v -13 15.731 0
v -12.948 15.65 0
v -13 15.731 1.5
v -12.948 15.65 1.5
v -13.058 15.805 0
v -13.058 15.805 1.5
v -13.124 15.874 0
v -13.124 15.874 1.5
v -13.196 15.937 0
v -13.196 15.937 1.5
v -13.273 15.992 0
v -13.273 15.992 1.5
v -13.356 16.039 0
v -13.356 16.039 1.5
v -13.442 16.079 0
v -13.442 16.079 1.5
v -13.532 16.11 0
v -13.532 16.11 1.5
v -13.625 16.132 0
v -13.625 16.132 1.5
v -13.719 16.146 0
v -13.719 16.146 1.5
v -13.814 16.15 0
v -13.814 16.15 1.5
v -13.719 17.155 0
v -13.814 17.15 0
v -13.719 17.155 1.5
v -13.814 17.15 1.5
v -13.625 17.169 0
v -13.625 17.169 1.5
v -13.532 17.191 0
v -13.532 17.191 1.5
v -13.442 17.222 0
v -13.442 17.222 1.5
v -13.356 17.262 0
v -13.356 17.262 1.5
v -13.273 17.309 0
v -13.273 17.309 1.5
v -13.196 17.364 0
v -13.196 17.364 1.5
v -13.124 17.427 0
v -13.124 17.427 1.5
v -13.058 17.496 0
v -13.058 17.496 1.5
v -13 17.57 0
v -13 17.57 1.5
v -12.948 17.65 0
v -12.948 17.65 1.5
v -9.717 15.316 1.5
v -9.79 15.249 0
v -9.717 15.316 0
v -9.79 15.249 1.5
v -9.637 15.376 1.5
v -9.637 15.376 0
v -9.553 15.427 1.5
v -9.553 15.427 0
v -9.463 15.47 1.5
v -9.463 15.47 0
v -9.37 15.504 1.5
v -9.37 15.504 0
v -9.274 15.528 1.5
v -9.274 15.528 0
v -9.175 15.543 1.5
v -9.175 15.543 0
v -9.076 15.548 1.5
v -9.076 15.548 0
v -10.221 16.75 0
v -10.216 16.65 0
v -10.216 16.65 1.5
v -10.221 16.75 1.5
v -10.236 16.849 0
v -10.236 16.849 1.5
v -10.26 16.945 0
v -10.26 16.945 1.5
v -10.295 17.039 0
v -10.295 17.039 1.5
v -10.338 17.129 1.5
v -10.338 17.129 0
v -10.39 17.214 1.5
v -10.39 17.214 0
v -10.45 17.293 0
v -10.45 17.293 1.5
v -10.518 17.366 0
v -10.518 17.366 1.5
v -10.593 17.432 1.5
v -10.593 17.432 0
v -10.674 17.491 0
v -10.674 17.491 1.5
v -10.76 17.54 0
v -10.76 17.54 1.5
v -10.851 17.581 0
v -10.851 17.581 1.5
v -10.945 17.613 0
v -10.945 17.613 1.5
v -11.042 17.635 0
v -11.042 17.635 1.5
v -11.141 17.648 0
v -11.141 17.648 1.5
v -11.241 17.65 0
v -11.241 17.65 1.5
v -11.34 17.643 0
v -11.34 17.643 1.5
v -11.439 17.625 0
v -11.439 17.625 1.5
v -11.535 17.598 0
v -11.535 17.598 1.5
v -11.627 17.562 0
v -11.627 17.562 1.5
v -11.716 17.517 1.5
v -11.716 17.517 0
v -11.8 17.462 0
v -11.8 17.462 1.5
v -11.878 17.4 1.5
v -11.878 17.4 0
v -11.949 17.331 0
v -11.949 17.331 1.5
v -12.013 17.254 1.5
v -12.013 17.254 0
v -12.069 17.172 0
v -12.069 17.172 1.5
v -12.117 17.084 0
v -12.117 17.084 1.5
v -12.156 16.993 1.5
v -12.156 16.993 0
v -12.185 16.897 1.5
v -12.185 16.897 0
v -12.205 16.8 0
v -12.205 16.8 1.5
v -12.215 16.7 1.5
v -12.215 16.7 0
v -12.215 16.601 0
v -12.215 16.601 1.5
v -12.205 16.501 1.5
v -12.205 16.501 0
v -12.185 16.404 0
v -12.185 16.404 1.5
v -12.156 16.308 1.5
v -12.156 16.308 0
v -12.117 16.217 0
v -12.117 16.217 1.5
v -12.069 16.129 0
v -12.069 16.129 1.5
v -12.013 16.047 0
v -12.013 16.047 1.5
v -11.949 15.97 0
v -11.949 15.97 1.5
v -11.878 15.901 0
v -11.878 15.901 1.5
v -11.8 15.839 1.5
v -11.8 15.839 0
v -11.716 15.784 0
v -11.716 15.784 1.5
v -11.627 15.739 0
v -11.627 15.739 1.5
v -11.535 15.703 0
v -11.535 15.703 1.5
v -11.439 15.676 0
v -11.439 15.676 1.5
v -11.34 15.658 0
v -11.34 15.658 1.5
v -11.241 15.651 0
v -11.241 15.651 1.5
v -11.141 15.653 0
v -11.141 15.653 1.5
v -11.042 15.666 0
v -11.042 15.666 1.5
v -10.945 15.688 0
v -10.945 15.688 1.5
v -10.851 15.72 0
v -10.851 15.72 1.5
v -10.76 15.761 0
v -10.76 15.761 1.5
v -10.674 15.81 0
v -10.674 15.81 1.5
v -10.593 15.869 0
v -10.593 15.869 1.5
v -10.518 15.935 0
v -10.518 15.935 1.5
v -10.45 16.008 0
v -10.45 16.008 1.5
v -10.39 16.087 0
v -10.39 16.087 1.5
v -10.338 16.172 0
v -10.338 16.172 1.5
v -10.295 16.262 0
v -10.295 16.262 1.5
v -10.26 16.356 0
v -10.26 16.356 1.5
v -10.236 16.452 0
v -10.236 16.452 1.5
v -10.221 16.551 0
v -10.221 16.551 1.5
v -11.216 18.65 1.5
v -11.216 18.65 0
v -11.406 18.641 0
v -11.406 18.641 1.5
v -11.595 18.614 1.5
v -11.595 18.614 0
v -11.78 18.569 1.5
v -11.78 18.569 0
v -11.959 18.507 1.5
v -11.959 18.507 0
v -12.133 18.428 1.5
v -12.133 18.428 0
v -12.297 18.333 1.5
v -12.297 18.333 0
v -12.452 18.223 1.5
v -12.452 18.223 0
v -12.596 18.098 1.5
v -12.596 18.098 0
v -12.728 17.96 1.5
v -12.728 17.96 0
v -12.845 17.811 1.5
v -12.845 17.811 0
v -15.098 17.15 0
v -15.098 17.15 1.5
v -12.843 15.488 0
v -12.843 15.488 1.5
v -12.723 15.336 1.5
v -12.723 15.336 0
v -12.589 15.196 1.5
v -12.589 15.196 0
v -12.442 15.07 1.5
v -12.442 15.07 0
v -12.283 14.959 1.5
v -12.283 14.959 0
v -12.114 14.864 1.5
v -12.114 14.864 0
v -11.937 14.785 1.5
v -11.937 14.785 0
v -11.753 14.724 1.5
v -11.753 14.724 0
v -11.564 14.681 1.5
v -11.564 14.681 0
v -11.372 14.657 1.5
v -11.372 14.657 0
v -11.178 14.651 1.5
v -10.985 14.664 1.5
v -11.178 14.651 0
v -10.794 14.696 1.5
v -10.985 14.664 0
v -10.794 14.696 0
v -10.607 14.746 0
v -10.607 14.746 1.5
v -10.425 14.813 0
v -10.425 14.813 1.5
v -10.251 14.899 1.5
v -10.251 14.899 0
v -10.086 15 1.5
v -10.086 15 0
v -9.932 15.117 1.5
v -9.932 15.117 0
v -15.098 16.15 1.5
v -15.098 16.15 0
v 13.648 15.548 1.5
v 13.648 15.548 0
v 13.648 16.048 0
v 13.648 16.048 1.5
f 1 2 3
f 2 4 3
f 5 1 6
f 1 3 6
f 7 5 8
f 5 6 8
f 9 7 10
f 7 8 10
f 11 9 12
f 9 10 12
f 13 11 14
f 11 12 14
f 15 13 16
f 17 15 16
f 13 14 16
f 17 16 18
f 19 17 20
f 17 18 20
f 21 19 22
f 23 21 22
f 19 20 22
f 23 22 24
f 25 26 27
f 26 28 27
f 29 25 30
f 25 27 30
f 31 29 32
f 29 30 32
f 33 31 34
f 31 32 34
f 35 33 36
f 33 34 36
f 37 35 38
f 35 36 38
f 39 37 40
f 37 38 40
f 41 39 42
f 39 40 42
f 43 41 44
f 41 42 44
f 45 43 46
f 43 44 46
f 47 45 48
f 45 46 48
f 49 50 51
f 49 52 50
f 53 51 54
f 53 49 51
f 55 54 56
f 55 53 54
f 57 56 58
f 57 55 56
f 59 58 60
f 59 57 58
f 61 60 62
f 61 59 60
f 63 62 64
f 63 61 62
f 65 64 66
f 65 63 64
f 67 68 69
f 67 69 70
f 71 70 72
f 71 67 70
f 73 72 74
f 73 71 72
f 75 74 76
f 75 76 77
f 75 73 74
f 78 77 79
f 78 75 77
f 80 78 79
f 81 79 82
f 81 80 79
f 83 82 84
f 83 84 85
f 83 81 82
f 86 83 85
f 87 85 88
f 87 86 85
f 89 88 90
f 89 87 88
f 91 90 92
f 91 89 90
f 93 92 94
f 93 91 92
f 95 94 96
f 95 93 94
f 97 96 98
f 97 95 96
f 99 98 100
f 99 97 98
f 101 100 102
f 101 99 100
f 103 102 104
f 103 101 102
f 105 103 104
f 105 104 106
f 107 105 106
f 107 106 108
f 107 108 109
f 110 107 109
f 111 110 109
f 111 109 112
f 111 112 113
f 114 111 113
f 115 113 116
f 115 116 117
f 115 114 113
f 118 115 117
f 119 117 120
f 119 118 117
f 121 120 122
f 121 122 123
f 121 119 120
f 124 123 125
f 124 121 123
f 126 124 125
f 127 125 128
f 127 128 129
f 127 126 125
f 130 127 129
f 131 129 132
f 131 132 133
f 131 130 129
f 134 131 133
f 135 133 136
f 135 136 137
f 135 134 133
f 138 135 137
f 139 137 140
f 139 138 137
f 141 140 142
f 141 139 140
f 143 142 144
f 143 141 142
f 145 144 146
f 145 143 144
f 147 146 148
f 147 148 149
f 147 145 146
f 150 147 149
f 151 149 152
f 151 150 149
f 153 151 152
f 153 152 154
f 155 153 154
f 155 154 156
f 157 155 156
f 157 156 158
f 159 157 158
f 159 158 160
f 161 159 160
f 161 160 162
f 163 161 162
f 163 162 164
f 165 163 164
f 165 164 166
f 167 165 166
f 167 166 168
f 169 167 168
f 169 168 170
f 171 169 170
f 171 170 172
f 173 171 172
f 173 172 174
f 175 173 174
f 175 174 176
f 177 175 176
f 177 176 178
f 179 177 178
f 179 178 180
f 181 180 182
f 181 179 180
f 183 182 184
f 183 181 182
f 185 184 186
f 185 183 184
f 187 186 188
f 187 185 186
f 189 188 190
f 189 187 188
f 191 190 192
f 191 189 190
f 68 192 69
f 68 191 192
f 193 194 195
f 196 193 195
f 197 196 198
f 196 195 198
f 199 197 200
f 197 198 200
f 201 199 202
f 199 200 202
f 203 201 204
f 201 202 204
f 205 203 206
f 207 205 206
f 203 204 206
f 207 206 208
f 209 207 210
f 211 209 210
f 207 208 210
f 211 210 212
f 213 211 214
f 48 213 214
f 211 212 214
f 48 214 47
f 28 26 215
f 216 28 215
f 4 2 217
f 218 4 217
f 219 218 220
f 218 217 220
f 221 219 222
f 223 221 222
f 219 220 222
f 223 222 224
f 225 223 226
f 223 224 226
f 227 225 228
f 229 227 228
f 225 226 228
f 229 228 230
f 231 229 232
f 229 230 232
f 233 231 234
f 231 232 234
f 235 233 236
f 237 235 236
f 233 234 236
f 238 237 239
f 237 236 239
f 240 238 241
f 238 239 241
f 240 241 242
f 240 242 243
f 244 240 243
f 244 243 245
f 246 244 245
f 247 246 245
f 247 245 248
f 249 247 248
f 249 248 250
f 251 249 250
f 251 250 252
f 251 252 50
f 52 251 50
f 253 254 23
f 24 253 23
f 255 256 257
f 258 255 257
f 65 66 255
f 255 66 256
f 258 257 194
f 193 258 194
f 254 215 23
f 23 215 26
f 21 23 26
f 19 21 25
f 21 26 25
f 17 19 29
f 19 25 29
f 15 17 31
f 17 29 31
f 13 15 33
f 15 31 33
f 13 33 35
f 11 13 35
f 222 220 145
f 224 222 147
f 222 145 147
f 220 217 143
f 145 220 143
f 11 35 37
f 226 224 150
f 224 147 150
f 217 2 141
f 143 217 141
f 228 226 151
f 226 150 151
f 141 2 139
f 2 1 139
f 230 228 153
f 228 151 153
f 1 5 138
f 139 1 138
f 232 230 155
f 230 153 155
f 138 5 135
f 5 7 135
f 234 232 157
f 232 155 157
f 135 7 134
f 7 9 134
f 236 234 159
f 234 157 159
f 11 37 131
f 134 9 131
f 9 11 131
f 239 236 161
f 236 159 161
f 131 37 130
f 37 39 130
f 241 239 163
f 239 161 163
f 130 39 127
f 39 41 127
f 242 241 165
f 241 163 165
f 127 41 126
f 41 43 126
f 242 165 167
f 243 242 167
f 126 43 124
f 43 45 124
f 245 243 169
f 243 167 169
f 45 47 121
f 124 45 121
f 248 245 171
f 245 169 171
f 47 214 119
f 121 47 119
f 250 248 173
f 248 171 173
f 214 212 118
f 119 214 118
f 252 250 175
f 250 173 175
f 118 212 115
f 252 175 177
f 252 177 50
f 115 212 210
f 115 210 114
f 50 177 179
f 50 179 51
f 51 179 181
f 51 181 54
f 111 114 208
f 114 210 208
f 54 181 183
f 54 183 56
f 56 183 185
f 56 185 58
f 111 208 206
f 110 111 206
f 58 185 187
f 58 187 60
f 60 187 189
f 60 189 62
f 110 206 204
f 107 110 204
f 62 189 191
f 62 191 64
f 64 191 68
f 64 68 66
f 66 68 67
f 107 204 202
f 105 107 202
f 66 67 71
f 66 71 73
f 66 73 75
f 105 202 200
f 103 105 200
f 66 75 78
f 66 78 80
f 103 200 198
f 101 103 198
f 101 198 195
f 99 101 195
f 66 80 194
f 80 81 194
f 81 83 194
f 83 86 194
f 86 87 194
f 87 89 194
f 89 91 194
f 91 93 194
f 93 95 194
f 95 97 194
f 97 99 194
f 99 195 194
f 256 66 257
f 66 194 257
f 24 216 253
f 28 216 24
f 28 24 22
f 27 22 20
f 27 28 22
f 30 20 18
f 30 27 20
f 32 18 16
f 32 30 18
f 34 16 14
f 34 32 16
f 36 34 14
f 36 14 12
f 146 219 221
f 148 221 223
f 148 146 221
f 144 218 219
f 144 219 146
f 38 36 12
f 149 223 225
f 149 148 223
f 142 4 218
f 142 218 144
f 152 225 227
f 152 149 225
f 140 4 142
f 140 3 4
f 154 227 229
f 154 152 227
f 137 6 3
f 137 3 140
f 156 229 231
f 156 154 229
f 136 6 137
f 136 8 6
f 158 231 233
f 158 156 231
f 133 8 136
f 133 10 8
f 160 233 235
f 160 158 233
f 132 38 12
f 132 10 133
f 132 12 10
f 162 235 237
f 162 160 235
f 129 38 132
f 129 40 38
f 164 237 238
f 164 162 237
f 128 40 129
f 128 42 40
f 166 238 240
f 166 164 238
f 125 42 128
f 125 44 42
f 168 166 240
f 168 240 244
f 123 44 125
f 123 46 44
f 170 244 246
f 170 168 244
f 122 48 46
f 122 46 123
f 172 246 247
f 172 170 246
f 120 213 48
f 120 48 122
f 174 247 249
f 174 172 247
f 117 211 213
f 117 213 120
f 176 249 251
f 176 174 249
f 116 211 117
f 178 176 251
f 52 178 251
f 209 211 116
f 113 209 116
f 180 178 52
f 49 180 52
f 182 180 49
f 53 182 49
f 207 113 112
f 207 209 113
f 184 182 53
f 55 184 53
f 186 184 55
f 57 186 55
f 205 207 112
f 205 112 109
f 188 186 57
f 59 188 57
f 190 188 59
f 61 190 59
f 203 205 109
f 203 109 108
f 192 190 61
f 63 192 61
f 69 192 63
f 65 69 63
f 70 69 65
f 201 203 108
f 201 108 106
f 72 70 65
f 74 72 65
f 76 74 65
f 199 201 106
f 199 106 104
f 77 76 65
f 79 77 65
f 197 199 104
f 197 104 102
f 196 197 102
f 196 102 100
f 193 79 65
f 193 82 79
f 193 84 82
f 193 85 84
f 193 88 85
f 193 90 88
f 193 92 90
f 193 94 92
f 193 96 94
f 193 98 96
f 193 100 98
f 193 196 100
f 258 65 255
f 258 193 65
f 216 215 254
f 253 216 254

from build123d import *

# Parameters (mm, degrees)
SKETCH1_R           = 1
BOSS_EXTRUDE1_DEPTH = 1.5
FILLET1_R           = 1
FILLET2_R           = 1
FILLET3_R           = 1


with BuildPart() as part:
    # Sketch1 → Boss-Extrude1 (new body)
    with BuildSketch(Plane.XY):
        with BuildLine():
            Line((13.648087548, 15.547724074), (13.648087548, 16.047724074))
            Line((13.648087548, 16.047724074), (-11.216055041, 18.650494389))
            ThreePointArc((-11.216055041, 18.650494389), (-12.440799912, 18.231633219), (-13.152546714, 17.150494389))
            Line((-13.152546714, 17.150494389), (-15.098105849, 17.150494389))
            Line((-15.098105849, 17.150494389), (-15.098105849, 16.150494389))
            Line((-15.098105849, 16.150494389), (-13.152546714, 16.150494389))
            ThreePointArc((-13.152546714, 16.150494389), (-11.545884817, 14.677878786), (-9.547553428, 15.547724074))
            Line((-9.547553428, 15.547724074), (13.648087548, 15.547724074))
        make_face()
        with Locations((-11.216055041, 16.650494389)):
            Circle(SKETCH1_R, mode=Mode.SUBTRACT)
    extrude(amount=BOSS_EXTRUDE1_DEPTH)

    # Fillet1
    fillet1_edges = [part.edges().sort_by_distance(p)[0] for p in [
        (-13.152546714, 16.150494389, 0.75),
    ]]
    fillet(fillet1_edges, radius=FILLET1_R)

    # Fillet2
    fillet2_edges = [part.edges().sort_by_distance(p)[0] for p in [
        (-13.152546714, 17.150494389, 0.75),
    ]]
    fillet(fillet2_edges, radius=FILLET2_R)

    # Fillet3
    fillet3_edges = [part.edges().sort_by_distance(p)[0] for p in [
        (-9.547553428, 15.547724074, 0.75),
    ]]
    fillet(fillet3_edges, radius=FILLET3_R)


solid = part.part
